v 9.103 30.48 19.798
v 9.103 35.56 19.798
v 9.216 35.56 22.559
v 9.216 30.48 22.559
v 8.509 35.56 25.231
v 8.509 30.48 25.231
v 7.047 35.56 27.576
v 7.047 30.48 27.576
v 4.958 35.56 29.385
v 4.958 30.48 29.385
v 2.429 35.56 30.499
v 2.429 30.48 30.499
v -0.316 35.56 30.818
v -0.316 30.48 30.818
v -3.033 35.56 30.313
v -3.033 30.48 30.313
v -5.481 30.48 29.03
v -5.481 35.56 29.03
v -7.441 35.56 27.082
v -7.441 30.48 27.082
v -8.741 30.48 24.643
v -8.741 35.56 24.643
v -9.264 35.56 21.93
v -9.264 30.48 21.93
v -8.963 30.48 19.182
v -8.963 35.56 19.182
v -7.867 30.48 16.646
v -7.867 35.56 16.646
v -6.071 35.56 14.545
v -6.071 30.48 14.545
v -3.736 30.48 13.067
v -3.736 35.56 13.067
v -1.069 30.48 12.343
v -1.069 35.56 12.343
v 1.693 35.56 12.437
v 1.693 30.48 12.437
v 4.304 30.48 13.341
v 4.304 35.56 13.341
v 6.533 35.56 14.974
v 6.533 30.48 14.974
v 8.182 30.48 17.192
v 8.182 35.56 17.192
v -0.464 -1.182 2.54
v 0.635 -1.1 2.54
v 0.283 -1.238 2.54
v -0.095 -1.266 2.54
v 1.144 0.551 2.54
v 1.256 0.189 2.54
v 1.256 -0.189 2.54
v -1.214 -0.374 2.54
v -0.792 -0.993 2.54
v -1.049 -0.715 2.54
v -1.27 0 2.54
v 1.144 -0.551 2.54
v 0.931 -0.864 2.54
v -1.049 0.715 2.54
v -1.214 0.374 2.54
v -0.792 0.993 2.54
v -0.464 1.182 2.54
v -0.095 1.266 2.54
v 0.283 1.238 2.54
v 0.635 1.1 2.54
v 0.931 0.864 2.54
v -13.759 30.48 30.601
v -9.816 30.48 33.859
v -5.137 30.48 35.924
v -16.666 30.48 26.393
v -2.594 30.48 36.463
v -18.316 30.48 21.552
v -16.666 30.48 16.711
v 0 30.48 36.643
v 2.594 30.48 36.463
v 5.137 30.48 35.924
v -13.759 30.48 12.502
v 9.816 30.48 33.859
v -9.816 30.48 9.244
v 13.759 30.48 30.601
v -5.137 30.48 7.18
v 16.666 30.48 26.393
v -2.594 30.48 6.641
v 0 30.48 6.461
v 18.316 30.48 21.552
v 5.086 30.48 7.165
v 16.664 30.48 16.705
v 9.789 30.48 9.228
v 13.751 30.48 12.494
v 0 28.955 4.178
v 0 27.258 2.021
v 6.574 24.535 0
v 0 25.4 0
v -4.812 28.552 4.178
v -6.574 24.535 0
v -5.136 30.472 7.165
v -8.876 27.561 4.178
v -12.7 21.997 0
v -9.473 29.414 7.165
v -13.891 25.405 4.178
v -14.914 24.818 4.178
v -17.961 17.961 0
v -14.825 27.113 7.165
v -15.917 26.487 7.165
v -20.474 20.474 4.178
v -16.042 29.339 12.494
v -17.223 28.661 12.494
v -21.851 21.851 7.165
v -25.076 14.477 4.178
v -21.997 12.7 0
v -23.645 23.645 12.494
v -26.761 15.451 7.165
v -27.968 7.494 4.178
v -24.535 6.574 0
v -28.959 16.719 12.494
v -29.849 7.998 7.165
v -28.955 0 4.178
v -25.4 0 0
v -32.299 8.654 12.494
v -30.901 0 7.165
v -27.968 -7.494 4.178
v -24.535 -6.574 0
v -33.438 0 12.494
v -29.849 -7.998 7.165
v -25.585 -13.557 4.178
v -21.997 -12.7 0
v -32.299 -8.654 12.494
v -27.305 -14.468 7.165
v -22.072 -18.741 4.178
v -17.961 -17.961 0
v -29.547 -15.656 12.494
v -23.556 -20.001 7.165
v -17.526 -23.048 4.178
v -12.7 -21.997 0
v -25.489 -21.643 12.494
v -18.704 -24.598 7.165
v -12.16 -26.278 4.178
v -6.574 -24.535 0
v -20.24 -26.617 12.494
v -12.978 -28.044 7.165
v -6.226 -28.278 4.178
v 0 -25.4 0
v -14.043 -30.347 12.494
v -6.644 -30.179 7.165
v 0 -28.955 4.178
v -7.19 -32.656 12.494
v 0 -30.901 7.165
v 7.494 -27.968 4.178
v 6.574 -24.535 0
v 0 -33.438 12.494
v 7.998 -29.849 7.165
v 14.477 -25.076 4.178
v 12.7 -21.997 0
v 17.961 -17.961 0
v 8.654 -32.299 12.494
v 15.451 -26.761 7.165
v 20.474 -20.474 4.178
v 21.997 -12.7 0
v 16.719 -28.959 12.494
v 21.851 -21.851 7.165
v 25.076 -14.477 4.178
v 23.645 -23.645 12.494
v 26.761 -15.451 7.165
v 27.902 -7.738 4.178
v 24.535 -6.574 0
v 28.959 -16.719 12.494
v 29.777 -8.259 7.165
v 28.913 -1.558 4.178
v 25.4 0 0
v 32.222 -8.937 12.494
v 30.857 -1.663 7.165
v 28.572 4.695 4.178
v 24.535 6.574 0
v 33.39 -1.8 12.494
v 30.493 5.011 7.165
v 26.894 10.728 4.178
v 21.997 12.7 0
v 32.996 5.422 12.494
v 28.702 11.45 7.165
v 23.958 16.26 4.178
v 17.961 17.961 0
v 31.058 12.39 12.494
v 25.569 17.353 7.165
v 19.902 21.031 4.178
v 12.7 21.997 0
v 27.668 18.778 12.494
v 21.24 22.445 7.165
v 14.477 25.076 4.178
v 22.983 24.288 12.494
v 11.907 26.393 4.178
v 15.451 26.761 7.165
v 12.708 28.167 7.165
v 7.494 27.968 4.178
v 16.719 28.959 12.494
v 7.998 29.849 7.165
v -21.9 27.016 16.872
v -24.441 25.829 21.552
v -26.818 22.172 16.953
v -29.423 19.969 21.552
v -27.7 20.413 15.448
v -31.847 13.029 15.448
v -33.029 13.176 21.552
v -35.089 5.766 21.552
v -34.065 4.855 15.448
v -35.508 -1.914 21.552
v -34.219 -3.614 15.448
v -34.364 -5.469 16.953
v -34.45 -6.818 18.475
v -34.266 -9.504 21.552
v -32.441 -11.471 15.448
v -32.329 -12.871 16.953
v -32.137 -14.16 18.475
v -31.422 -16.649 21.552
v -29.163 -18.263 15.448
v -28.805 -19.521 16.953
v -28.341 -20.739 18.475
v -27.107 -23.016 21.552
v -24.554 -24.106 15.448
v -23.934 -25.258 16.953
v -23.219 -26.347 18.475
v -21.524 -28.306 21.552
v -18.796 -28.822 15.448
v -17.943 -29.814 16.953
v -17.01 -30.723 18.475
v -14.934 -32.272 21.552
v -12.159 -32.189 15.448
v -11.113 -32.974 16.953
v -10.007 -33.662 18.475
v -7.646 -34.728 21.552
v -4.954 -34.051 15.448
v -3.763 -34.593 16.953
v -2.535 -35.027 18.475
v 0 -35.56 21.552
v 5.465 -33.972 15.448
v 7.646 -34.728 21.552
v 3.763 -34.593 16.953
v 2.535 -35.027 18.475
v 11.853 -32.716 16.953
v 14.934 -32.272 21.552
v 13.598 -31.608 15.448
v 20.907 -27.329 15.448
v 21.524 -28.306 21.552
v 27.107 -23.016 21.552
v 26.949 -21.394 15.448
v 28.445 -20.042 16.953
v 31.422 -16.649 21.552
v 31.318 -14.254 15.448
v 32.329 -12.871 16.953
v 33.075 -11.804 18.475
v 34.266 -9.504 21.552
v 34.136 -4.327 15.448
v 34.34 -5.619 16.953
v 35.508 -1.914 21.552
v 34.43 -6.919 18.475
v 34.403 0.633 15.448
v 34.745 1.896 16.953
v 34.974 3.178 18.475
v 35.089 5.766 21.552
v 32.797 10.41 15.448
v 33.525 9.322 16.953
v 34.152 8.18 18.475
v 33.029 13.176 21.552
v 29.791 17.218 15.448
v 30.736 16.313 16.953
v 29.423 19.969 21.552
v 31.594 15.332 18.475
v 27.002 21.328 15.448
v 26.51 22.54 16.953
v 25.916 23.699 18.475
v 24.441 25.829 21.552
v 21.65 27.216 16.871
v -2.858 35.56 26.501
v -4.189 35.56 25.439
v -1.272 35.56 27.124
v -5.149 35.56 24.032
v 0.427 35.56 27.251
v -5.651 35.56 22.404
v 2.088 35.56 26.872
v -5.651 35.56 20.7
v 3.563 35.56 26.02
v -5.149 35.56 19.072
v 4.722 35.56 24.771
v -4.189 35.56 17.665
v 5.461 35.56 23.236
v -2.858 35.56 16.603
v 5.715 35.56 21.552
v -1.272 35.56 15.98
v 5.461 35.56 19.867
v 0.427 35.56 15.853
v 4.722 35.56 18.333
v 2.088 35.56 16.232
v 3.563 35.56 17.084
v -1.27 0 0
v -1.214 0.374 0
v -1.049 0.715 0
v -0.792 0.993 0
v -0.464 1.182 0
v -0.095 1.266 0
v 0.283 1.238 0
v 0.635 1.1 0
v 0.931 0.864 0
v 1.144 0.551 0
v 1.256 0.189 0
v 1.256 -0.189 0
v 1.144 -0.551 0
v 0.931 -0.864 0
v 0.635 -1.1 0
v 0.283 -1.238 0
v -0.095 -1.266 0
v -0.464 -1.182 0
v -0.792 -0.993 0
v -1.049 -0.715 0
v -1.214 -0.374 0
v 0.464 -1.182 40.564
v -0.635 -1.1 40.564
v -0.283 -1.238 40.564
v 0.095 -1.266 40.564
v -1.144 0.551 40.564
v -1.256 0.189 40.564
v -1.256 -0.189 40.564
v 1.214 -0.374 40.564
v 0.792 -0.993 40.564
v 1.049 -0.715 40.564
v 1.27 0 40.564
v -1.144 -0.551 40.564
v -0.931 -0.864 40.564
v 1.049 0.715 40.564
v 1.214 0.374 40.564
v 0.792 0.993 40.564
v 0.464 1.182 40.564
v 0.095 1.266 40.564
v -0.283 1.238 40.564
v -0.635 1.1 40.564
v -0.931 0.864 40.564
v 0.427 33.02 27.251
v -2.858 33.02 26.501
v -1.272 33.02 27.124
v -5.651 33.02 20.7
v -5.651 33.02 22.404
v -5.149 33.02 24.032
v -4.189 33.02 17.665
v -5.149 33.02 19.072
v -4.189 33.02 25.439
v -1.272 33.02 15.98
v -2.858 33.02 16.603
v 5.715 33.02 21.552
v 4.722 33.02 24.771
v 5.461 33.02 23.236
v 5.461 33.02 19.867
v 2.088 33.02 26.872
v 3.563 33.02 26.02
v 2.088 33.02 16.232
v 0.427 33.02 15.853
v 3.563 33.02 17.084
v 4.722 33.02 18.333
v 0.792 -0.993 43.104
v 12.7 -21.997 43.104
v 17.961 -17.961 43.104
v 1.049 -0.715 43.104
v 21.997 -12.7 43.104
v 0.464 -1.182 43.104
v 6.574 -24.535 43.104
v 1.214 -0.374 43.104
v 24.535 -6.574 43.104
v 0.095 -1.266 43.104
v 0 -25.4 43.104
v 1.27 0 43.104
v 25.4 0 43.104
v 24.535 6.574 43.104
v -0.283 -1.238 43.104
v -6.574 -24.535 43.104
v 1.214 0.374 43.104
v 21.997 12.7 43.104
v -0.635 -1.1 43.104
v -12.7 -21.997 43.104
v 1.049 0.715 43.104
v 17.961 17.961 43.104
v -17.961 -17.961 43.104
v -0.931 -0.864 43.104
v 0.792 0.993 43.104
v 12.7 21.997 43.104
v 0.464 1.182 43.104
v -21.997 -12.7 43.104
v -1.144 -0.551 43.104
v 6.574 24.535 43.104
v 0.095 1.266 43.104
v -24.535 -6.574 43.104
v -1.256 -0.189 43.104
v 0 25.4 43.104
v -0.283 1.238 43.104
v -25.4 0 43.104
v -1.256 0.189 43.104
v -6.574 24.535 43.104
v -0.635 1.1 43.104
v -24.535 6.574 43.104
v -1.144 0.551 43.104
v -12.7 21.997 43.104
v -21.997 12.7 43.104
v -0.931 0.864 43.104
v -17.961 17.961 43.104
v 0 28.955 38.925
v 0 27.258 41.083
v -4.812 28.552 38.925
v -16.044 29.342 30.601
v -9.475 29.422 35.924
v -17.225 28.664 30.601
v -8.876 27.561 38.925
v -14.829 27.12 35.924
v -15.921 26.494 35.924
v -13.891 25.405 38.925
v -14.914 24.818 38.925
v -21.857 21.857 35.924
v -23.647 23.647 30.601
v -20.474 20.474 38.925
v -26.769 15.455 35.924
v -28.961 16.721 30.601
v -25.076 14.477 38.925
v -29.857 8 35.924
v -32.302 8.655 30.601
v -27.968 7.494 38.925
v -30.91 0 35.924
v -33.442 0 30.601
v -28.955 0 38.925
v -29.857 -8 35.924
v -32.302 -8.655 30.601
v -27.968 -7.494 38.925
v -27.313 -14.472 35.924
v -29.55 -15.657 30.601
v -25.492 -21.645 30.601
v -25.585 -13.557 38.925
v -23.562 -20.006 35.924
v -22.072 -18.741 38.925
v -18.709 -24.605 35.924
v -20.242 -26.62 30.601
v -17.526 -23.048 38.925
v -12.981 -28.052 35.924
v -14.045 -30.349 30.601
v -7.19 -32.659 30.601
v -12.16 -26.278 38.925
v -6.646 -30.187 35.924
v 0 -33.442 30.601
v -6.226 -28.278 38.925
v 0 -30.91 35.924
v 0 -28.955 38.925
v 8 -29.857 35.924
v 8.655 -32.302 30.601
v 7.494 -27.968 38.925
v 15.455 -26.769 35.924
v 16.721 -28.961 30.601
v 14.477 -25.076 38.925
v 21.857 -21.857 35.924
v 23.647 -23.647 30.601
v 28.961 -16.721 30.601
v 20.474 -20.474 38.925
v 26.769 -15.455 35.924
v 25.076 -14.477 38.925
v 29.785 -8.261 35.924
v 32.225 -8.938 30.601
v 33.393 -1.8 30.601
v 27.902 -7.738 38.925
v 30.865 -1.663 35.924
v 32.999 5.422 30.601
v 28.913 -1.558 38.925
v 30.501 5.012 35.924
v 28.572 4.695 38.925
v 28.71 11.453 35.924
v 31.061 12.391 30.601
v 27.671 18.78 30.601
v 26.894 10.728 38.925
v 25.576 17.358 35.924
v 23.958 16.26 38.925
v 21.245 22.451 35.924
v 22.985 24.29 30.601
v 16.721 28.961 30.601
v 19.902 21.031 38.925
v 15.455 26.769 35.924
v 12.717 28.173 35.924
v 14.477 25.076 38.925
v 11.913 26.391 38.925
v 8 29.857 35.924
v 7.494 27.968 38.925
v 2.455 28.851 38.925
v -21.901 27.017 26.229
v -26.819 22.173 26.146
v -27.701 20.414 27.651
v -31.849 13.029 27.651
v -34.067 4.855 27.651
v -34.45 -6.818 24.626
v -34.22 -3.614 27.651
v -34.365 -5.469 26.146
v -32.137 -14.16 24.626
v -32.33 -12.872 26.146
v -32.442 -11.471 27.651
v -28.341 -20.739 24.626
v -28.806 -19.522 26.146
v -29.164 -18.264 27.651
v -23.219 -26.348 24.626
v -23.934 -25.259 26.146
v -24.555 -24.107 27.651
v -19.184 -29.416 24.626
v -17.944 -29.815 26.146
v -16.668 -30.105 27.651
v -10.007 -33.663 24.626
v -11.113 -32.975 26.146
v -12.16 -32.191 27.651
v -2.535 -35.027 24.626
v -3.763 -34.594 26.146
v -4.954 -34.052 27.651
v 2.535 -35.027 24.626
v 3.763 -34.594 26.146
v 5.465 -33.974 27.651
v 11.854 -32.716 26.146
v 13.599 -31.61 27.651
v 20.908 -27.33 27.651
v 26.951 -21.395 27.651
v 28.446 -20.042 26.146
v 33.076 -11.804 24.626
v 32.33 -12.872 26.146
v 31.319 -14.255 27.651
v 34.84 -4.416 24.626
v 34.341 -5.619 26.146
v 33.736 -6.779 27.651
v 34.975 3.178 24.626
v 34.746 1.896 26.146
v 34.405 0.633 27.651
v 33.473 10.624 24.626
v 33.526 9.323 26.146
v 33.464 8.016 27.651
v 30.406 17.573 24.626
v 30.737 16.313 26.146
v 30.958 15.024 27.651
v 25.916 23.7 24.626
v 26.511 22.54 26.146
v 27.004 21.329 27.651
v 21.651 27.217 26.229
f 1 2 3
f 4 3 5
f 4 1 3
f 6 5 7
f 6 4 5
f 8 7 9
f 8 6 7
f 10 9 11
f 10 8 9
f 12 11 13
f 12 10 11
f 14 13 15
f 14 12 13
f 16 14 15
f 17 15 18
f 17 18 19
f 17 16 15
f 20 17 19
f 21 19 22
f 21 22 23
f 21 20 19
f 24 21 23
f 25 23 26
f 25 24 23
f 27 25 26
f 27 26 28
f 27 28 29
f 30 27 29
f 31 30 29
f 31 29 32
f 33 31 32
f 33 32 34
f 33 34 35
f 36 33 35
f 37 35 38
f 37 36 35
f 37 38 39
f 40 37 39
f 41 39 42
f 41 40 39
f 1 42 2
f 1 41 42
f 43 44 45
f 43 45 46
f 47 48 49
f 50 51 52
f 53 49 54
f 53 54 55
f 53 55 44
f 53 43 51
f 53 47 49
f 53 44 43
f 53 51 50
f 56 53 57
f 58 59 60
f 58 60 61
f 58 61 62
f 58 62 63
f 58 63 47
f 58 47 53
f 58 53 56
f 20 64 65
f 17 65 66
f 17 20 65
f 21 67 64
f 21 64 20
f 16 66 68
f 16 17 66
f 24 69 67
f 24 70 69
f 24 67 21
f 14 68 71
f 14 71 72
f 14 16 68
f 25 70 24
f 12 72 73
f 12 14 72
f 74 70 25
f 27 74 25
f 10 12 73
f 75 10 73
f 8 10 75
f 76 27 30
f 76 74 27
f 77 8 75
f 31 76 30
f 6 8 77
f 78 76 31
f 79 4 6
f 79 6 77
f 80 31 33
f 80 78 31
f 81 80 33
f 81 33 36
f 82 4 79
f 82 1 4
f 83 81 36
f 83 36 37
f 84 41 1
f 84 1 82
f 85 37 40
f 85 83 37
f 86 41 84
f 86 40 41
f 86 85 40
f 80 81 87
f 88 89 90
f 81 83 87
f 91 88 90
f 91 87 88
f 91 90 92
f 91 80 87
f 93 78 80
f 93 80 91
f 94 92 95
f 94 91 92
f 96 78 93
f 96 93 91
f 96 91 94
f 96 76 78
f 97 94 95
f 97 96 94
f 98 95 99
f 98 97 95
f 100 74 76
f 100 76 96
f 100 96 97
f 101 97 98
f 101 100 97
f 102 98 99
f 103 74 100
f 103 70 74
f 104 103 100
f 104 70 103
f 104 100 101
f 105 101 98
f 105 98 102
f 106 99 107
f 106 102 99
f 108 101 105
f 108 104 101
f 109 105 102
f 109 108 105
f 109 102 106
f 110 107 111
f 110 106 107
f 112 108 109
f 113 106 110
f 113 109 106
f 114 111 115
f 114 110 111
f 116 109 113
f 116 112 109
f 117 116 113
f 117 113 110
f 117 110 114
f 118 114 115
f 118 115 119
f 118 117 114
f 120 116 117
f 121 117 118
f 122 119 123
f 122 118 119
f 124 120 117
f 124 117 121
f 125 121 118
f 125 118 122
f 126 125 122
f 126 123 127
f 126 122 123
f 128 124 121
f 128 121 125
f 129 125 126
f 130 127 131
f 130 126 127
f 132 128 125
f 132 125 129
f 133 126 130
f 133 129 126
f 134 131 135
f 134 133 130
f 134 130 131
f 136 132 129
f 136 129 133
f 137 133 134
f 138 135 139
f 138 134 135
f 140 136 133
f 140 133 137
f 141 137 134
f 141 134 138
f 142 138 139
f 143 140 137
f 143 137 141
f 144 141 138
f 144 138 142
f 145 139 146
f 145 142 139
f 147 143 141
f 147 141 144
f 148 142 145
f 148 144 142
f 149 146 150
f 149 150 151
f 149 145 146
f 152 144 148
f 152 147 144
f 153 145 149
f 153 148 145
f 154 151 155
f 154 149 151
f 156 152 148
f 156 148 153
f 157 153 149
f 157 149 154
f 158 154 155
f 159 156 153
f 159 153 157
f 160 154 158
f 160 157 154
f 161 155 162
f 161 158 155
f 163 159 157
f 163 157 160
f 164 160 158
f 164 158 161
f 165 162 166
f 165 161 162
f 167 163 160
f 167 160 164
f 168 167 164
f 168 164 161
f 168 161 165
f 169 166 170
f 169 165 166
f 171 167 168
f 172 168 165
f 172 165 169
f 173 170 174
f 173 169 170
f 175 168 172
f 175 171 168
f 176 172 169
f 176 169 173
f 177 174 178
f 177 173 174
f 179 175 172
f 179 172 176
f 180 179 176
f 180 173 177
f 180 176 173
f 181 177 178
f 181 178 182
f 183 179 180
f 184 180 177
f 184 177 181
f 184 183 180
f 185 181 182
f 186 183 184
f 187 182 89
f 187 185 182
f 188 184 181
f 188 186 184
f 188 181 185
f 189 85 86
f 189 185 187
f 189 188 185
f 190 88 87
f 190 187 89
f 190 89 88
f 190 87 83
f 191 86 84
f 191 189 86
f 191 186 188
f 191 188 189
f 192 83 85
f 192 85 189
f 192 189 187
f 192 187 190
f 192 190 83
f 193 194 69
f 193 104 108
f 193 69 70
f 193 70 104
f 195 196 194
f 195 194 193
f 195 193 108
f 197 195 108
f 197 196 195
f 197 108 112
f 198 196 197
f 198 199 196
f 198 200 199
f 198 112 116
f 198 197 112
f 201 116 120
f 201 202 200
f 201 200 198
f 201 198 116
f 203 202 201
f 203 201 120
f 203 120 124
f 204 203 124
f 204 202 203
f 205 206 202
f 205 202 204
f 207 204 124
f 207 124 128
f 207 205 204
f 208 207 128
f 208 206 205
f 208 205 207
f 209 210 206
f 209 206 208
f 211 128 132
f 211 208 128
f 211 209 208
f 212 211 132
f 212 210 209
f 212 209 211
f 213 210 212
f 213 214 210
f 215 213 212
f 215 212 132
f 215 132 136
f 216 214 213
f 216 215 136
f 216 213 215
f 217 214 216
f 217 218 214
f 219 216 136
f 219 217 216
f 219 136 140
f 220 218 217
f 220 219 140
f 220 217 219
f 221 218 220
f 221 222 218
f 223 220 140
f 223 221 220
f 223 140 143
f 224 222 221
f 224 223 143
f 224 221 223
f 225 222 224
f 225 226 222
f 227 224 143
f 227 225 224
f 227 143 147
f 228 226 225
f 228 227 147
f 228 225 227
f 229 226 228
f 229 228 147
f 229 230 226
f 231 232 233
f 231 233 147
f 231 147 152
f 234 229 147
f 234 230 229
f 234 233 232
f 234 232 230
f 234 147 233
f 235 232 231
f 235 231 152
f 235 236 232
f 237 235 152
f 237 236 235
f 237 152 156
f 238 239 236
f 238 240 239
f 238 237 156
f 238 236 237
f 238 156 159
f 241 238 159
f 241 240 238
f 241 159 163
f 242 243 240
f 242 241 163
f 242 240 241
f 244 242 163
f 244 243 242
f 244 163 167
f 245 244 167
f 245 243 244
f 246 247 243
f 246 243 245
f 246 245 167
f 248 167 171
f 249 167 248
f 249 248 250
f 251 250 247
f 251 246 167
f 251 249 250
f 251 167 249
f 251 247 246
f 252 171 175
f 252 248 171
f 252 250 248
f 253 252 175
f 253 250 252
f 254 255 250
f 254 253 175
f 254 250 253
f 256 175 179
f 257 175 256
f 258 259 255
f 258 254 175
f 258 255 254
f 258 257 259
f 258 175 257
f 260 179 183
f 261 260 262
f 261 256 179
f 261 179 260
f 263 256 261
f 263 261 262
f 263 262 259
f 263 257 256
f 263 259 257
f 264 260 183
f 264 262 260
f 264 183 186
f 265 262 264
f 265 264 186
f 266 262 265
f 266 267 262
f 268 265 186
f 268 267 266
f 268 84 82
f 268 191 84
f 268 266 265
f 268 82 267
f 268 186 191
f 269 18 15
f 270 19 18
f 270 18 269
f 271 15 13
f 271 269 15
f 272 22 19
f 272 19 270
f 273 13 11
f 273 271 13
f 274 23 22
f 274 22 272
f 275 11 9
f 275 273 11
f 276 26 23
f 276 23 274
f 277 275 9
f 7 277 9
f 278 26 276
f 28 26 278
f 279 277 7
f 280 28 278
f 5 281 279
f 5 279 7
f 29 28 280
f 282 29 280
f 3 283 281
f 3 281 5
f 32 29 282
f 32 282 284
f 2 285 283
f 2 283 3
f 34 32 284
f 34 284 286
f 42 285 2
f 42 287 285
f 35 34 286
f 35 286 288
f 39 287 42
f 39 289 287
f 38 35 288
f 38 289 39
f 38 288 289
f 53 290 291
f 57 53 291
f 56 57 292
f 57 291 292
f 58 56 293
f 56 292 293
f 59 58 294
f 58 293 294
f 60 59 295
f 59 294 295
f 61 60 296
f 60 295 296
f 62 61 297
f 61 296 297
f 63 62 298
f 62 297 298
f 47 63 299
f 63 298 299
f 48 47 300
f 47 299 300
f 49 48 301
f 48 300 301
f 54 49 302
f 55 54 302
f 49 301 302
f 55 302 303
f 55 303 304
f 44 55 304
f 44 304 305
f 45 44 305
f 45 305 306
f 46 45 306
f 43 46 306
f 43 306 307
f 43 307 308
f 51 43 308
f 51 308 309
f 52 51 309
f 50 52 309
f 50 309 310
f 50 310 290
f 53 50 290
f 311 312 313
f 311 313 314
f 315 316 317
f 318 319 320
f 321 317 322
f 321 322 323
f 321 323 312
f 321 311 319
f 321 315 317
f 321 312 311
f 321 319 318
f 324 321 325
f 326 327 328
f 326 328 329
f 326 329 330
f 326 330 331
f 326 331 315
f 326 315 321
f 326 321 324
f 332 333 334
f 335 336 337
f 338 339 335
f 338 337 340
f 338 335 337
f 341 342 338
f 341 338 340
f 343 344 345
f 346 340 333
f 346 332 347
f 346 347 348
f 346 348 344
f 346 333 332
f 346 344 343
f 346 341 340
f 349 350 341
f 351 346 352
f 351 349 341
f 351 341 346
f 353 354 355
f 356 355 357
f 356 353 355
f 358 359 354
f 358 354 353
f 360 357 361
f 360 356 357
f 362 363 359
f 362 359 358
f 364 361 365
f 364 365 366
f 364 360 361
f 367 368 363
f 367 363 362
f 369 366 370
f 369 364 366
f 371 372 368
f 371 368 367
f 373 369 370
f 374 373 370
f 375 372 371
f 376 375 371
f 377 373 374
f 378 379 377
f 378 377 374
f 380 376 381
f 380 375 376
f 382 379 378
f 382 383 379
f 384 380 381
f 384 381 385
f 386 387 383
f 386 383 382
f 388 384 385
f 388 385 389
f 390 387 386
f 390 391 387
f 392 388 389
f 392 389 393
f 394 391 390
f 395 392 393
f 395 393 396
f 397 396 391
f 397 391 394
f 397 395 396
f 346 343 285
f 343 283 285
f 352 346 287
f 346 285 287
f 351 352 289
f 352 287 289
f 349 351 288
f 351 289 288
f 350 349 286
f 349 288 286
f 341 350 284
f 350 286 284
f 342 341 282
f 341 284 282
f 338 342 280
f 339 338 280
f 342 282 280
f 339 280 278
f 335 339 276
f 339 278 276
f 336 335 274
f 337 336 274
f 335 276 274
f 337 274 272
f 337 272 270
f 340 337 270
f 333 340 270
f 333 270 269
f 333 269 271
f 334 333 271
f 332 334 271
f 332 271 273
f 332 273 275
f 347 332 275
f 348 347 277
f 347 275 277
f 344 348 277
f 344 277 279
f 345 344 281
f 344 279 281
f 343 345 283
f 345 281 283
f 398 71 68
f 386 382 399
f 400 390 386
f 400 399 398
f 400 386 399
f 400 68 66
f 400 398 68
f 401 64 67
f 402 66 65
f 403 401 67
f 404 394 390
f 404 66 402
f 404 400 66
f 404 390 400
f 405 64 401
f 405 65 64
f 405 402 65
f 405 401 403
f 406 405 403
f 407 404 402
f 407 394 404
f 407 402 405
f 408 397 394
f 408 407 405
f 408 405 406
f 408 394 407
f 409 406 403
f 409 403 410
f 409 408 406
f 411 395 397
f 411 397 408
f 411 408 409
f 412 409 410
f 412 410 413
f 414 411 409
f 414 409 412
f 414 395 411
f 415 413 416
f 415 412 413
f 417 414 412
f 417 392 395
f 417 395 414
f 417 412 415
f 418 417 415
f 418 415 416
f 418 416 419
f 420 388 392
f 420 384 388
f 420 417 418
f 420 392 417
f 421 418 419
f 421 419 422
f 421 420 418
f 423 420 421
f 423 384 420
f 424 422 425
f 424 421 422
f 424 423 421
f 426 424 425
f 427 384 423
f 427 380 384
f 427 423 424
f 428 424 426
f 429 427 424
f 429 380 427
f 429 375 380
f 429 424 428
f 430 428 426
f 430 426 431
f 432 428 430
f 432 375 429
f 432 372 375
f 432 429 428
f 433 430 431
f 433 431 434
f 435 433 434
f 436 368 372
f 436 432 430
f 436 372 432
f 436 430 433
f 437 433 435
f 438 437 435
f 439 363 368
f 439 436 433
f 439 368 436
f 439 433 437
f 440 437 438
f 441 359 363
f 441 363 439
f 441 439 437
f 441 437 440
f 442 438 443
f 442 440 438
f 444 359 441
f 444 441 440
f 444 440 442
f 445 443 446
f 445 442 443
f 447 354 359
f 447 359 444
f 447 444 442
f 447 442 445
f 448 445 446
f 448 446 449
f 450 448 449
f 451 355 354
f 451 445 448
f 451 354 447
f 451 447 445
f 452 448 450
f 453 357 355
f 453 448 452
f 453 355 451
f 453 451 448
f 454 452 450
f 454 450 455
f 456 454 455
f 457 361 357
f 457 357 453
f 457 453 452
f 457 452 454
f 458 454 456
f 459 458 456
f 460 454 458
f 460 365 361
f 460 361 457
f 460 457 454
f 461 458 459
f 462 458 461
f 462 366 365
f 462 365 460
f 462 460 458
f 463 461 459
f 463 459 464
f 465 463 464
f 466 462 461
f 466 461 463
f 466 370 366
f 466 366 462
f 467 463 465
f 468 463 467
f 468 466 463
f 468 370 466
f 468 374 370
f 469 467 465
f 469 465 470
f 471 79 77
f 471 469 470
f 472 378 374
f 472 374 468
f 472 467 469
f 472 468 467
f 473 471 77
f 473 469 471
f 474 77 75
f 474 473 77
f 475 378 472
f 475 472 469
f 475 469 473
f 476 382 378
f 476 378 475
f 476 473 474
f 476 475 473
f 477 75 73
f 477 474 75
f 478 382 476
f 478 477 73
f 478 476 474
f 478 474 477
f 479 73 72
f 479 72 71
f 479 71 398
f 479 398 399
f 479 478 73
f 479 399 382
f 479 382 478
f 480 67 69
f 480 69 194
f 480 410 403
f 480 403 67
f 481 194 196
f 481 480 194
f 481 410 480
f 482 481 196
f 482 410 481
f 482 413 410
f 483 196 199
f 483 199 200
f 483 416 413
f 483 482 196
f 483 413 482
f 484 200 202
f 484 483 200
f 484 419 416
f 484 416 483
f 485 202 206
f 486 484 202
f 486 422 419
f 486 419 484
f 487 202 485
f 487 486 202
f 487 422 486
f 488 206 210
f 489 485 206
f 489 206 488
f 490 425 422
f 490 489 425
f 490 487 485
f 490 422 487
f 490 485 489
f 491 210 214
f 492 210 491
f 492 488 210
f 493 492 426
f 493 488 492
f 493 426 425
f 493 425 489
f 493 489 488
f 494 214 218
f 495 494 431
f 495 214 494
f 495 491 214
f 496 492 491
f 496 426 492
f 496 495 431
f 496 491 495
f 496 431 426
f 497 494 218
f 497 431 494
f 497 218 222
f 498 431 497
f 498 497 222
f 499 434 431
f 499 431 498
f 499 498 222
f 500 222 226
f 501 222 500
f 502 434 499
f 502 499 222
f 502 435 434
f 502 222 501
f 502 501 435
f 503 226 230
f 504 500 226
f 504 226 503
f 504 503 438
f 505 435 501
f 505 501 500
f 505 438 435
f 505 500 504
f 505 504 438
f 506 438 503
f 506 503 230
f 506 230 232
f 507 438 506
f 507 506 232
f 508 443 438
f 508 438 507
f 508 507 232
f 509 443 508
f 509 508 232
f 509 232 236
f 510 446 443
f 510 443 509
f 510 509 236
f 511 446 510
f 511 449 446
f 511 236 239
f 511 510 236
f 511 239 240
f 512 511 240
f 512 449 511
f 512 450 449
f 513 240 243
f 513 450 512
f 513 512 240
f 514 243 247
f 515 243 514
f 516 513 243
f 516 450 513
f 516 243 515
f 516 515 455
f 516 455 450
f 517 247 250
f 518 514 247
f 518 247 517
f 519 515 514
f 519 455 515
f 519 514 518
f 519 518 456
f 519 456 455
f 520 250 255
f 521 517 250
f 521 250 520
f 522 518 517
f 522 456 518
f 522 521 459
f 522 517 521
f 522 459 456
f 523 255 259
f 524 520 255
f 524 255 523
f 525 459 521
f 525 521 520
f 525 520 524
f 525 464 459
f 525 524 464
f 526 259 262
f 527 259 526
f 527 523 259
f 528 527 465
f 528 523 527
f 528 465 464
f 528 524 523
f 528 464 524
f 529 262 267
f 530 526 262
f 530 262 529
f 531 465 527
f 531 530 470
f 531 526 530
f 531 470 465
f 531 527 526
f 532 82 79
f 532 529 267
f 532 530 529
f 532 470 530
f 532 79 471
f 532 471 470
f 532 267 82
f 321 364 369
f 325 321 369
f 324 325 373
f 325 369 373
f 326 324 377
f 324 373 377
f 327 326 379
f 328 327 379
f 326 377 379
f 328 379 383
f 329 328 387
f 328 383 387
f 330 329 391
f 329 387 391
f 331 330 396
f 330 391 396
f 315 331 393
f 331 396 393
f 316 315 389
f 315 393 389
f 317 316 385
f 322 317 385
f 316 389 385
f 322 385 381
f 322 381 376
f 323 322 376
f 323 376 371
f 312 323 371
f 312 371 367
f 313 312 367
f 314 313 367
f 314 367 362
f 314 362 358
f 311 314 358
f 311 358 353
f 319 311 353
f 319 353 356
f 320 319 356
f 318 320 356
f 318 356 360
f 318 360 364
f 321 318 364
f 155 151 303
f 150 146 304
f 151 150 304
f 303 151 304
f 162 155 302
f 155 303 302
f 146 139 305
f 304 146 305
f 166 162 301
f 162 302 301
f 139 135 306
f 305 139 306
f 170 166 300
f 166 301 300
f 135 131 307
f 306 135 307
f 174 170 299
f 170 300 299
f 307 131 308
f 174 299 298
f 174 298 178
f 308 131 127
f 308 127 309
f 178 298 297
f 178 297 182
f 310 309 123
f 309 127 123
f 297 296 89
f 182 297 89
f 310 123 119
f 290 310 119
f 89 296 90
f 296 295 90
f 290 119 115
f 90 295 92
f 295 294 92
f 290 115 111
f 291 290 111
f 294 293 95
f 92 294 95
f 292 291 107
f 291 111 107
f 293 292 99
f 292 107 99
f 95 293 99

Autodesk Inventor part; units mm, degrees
ref_plane "YZ Plane" through (0, 0, 0) normal (1, 0, 0) x (0, 1, 0)
ref_plane "XZ Plane" through (0, 0, 0) normal (0, 1, 0) x (-1, 0, 0)
ref_plane "XY Plane" through (0, 0, 0) normal (0, 0, 1) x (1, 0, 0)
sketch "Sketch1" plane through (0, 0, 0) normal (1, 0, 0) x (0, 1, 0)
  line L0 (0, 0) -> (0, 43.1038)
  line L1 (0, 21.5519) -> (35.56, 21.5519)
  line L2 (0, 43.1038) -> (25.4, 43.1038)
  line L3 (0, 0) -> (25.4, 0)
  arc A0 (25.4, 0) -> (35.56, 21.5519) centre (0.1738, 25.0629) ccw
  arc A1 (35.56, 21.5519) -> (25.4, 43.1038) centre (0.1738, 18.0409) ccw
  dimension "d0" = 43.1038
  dimension "d1" = 35.56
  dimension "d2" = 25.4
  dimension "d4" = 25.4
  dimension "d5" = 35.56
  dimension "d6" = 35.56
revolve "Revolution2" add sketch "Sketch1" angle 360 about axis through (0, 0, 0) along (0, 0, 1)
sketch "Sketch3" plane through (0, 0, 0) normal (0, 0, -1) x (-1, 0, 0)
  circle A0 centre (0, 0) radius 25.4 projected
  line L0 (0, 0) -> (0, 30.48)
  line L1 (0, 30.48) -> (9.144, 30.48)
  line L2 (9.144, 30.48) -> (18.3162, 30.48)
  circle A1 centre (0, 0) radius 35.56 projected
  line L3 (0, 30.48) -> (-18.3162, 30.48)
  line L4 (0, 30.48) -> (0, 35.56)
  arc A2 (0, 35.56) -> (-18.3162, 30.48) centre (0, 0) ccw
  arc A3 (18.3162, 30.48) -> (0, 35.56) centre (0, 0) ccw
  dimension "d11" = 30.48
  dimension "d12" = 9.144
extrude "Extrusion1" cut sketch "Sketch3" against normal blind 47.625 contours L3 A1 L4 | L4 A1 L2 L1
sketch "Sketch4" plane through (0, 30.48, 29.0975) normal (0, 1, 0) x (0.9819, 0, -0.1892)
  line L0 (-16.5583, 10.874) -> (19.4128, 3.9448)
  line L1 (36.3453, 0.6831) -> (-33.4908, 14.1357) projected
  circle A0 centre (1.4273, 7.4094) radius 9.271
  point P0 (5.5039, 28.5723)
  dimension "d15" = 18.542
extrude "Extrusion2" add sketch "Sketch4" along normal blind 5.08
sketch "Sketch5" plane through (0, 35.56, 21.5519) normal (0, 1, 0) x (1, 0, 0)
  line L0 (35.56, 0) -> (-35.56, 0) projected
  circle A0 centre (0, 0) radius 5.715
  point P0 (0, 21.5519)
  point P1 (18.3162, 0)
  point P2 (-18.3162, 0)
  dimension "d18" = 11.43
extrude "Extrusion3" cut sketch "Sketch5" against normal blind 2.54
sketch "Sketch6" plane through (0, 0, 0) normal (0, 0, -1) x (-1, 0, 0)
  circle A0 centre (0, 0) radius 1.27
  dimension "d21" = 2.54
sketch "Sketch7" plane through (0, 0, 43.1038) normal (0, 0, 1) x (1, 0, 0)
  circle A0 centre (0, 0) radius 1.27
  dimension "d22" = 2.54
extrude "Extrusion4" cut sketch "Sketch6" against normal blind 2.54
extrude "Extrusion5" cut sketch "Sketch7" against normal blind 2.54
properties material "UHMW, White"
